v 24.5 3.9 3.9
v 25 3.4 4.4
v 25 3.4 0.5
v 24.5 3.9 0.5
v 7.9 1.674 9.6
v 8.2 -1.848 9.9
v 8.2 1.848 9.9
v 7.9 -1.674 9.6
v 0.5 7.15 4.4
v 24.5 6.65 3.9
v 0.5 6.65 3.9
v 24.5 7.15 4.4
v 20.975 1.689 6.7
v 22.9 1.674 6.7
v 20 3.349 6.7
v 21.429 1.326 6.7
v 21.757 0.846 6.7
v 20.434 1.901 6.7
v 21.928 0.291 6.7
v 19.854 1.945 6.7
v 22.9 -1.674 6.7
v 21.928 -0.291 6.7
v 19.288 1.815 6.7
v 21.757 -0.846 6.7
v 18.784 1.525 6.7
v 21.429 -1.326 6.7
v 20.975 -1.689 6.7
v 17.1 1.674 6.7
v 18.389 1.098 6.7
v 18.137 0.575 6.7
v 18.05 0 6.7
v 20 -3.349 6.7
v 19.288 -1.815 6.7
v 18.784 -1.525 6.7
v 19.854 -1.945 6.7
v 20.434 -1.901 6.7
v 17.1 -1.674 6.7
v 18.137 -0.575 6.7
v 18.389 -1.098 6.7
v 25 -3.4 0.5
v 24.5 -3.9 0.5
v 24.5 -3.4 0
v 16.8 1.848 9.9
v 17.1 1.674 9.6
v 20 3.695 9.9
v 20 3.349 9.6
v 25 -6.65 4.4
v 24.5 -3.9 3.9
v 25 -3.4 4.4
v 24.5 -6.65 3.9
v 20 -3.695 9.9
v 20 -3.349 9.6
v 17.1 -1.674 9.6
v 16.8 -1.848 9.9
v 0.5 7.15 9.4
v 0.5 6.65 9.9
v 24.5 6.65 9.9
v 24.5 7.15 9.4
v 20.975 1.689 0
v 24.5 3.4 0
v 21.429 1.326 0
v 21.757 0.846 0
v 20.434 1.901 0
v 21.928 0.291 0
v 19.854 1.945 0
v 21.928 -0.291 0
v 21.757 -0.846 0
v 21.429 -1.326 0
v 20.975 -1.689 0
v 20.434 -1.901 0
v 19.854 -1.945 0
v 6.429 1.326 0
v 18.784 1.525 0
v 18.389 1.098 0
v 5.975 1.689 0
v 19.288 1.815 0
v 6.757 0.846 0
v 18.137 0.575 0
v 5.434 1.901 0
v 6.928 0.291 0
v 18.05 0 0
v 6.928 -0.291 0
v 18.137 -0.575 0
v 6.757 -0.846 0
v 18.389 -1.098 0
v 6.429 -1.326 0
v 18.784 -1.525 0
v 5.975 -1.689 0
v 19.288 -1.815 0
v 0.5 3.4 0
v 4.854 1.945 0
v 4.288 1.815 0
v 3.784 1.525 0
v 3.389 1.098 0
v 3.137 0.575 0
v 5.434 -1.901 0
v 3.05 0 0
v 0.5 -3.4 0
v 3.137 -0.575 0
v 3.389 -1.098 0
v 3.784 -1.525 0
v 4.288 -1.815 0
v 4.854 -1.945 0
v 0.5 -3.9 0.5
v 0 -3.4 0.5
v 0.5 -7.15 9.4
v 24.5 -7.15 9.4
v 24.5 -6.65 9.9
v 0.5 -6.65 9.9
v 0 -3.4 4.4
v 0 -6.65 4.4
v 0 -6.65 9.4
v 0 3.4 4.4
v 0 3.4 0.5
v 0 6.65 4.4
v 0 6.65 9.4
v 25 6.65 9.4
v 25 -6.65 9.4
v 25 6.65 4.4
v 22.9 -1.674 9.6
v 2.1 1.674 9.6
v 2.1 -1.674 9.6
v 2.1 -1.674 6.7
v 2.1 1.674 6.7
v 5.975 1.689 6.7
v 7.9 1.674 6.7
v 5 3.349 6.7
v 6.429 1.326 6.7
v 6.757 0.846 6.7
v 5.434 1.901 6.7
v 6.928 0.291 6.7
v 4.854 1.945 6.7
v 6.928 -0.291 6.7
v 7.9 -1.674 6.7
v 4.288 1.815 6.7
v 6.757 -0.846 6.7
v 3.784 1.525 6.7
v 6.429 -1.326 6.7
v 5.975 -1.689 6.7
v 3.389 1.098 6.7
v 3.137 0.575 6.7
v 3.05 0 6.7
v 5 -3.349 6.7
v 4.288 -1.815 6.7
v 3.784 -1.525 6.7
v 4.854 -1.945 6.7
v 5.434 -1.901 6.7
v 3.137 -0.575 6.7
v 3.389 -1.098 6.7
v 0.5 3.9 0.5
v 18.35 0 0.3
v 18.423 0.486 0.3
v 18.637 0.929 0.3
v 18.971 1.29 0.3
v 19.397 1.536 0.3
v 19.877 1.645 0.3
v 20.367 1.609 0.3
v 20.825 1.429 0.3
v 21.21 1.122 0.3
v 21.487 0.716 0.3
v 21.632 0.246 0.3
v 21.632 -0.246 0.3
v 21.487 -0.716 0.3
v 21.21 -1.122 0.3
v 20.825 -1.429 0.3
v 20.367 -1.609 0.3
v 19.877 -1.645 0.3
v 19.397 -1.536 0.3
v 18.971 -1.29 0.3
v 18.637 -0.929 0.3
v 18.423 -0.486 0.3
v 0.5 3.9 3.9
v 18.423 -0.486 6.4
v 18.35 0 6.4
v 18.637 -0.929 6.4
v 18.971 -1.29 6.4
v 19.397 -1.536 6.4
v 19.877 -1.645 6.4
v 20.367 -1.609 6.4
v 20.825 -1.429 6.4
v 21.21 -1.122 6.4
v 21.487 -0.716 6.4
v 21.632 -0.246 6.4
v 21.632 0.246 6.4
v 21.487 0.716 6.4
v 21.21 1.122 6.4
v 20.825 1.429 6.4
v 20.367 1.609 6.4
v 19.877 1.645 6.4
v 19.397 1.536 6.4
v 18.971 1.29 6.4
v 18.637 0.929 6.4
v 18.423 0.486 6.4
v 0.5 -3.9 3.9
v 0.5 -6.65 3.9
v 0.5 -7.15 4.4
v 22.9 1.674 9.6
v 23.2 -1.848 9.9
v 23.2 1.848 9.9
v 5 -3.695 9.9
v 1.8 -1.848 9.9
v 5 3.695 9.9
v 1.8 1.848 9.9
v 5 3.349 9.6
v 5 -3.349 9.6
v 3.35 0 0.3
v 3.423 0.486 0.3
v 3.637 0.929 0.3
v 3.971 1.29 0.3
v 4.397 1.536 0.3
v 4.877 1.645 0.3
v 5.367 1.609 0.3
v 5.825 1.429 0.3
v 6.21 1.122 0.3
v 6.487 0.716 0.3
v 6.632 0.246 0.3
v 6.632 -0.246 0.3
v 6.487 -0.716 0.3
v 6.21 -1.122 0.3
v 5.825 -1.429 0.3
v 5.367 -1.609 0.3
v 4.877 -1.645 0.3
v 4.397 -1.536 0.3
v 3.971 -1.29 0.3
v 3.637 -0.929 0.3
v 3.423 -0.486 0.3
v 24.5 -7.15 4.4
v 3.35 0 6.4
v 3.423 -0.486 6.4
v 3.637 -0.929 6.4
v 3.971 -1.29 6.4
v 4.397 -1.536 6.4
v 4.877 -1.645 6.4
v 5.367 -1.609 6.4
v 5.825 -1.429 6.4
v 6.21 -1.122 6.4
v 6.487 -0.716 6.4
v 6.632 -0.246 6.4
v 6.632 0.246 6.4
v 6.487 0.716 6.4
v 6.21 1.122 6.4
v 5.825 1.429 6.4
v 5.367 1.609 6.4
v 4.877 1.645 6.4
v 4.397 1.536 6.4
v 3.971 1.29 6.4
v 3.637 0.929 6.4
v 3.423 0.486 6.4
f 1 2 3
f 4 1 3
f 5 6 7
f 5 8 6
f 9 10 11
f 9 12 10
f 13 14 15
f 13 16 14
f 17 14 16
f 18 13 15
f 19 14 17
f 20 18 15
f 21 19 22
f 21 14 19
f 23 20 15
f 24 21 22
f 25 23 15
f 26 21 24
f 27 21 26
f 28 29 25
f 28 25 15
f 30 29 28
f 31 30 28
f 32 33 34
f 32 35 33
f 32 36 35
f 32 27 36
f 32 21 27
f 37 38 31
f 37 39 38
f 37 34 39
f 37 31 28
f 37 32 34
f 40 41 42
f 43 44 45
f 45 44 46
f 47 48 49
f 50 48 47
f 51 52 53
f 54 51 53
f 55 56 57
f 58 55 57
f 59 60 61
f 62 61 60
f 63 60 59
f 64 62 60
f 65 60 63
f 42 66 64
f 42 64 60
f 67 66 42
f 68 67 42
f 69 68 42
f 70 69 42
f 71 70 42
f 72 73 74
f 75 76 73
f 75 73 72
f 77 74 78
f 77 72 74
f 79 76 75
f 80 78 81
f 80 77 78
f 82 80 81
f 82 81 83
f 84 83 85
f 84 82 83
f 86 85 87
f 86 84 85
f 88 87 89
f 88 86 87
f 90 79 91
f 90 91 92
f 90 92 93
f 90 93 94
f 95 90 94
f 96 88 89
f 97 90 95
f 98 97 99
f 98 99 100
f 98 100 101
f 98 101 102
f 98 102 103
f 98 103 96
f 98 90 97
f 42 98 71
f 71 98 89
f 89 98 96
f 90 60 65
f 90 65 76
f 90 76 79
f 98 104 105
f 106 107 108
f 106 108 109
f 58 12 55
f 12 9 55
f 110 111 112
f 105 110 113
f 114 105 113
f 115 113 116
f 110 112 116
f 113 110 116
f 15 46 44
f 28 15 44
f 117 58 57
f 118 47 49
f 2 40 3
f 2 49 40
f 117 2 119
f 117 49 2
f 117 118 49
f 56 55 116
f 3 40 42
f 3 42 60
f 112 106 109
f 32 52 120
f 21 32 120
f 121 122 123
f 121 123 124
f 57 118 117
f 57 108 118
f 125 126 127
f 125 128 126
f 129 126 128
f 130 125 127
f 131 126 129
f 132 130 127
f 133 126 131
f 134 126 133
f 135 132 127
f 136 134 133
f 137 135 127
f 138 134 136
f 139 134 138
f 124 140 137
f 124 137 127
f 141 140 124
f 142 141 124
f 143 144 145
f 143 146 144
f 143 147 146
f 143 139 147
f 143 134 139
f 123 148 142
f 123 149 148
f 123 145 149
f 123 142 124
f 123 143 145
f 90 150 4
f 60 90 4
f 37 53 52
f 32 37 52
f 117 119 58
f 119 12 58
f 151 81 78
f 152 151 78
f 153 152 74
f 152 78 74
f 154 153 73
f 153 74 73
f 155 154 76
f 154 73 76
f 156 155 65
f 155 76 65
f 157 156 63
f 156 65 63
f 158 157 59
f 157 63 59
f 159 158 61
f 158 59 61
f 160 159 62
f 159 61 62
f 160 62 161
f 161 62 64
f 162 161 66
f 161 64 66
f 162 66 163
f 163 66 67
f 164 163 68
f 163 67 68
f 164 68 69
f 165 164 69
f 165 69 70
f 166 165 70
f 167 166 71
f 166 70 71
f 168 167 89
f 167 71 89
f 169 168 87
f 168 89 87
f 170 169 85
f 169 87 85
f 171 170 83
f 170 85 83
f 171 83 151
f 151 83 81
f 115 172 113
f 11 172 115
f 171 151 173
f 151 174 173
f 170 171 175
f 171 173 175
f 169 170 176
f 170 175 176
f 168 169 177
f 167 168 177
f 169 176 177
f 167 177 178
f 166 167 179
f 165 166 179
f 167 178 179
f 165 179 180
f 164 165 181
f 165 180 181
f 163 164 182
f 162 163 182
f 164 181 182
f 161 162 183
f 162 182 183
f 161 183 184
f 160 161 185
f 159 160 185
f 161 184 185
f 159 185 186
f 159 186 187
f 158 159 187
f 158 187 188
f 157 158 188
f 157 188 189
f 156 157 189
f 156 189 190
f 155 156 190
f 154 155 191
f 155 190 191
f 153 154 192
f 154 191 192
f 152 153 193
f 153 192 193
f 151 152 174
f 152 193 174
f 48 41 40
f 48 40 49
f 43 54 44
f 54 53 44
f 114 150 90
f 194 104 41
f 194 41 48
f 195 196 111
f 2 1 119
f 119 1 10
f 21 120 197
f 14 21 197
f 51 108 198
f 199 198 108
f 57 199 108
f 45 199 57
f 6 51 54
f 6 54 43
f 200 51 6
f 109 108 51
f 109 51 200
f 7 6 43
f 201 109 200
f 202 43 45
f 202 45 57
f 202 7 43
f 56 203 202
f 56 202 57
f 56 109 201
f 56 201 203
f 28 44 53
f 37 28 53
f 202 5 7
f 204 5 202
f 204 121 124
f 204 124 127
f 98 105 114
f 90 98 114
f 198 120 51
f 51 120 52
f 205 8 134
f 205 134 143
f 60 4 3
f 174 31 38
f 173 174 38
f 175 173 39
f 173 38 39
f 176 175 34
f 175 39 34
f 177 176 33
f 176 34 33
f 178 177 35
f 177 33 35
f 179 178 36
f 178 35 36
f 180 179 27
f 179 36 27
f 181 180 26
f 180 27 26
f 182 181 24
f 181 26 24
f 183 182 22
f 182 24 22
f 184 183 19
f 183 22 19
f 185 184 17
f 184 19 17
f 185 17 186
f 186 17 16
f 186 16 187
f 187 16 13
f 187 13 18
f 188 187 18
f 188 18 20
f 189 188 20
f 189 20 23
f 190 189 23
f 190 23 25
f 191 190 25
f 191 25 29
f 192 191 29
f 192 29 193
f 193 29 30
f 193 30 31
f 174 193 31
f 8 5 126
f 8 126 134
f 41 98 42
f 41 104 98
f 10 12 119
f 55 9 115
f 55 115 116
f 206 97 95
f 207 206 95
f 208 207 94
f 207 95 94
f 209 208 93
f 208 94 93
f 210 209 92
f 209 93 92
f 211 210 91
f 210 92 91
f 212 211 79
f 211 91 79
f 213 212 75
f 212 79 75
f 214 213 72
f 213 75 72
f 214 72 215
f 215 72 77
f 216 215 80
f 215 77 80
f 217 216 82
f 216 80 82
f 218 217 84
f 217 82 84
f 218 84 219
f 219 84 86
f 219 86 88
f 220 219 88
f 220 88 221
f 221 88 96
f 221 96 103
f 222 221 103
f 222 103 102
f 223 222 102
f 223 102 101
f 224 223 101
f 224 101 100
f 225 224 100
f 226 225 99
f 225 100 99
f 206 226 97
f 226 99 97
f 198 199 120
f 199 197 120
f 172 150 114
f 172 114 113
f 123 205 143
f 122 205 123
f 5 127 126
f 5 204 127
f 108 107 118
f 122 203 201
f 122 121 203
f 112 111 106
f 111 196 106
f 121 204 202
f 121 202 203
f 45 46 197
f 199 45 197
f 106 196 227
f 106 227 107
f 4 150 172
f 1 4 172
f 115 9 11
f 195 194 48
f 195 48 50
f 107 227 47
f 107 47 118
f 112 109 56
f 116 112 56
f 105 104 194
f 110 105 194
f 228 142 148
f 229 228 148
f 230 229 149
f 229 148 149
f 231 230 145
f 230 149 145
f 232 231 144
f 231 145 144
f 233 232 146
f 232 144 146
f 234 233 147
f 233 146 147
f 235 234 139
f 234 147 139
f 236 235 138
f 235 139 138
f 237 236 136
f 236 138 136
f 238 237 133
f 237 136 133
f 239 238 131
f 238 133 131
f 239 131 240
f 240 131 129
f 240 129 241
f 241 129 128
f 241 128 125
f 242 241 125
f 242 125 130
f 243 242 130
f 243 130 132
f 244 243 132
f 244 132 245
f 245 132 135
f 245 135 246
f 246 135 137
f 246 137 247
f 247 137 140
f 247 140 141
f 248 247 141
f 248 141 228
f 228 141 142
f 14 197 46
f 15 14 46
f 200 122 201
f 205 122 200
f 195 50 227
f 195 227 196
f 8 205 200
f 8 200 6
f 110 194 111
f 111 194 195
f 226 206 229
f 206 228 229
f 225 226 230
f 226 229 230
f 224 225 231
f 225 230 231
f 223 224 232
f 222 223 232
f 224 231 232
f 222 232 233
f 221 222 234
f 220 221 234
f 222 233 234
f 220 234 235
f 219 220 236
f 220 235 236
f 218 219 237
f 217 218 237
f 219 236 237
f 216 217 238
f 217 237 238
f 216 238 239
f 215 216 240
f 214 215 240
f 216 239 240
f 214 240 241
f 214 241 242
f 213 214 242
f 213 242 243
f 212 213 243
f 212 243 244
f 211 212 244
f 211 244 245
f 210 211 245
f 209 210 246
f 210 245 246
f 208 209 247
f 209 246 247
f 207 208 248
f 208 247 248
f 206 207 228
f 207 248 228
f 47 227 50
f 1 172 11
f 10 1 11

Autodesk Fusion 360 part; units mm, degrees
sketch "Skizze1" plane through (0, 0, 0) normal (1, 0, 0) x (0, 1, 0)
  line L0 (0, 0) -> (0, 17.0455) construction
  line L1 (0, 0) -> (-3.9, 0)
  line L2 (-3.9, 0) -> (-3.9, 3.9)
  line L3 (-3.9, 3.9) -> (-7.15, 3.9)
  line L4 (-7.15, 3.9) -> (-7.15, 9.9)
  line L5 (-7.15, 9.9) -> (0, 9.9)
  line L6 (0, 0) -> (3.9, 0)
  line L7 (3.9, 0) -> (3.9, 3.9)
  line L8 (3.9, 3.9) -> (7.15, 3.9)
  line L9 (7.15, 3.9) -> (7.15, 9.9)
  line L10 (7.15, 9.9) -> (0, 9.9)
  dimension "d2" = 14.3
  dimension "d4" = 3.9
  dimension "d5" = 7.8
  dimension "d17" = 6
extrude "Extrusion1" add sketch "Skizze1" along normal blind 25
sketch "Skizze2" plane through (0, 0, 9.9) normal (0, 0, 1) x (-1, 0, 0)
  line L0 (0, -7.15) -> (0, 7.15)
  line L1 (0, 7.15) -> (-25, 7.15)
  line L2 (-25, 7.15) -> (-25, -7.15)
  line L3 (-25, -7.15) -> (0, -7.15)
  line L4 (-12.5, -7.15) -> (-12.5, 7.15)
  circle A0 centre (-20, 0) radius 1.65
  line L5 (-17.1, 1.6743) -> (-20, 3.3486)
  line L6 (-20, 3.3486) -> (-22.9, 1.6743)
  line L7 (-22.9, 1.6743) -> (-22.9, -1.6743)
  line L8 (-22.9, -1.6743) -> (-20, -3.3486)
  line L9 (-20, -3.3486) -> (-17.1, -1.6743)
  line L10 (-17.1, -1.6743) -> (-17.1, 1.6743)
  line L11 (-12.5, 0) -> (-20, 0) construction
  line L12 (-7.9, -1.6743) -> (-7.9, 1.6743)
  line L13 (-5, 3.3486) -> (-2.1, 1.6743)
  line L14 (-2.1, -1.6743) -> (-5, -3.3486)
  line L15 (-5, -3.3486) -> (-7.9, -1.6743)
  line L16 (-7.9, 1.6743) -> (-5, 3.3486)
  line L17 (-2.1, 1.6743) -> (-2.1, -1.6743)
  circle A1 centre (-5, 0) radius 1.65
  point P0 (-20, 0)
  point P1 (-5, 0)
  point P2 (-5, 0)
  dimension "d8" = 3.3
  dimension "d9" = 5.8
  dimension "d10" = 15
extrude "Extrusion2" cut sketch "Skizze2" against normal through all contours A0 | A1
extrude "Extrusion3" cut sketch "Skizze2" against normal blind 3.2 contours L5 L6 L7 L8 L9 L10 | L12 L13 L14 L15 L16 L17
chamfer "Fase1" distance 0.3 angle 45 4 edges at (6.5383, 0.5967, 0) (21.5383, 0.5967, 0) (6.5383, 0.5967, 6.7) (21.5383, 0.5967, 6.7)
chamfer "Fase1" distance 0.5 angle 45 22 edges at (0, 7.15, 6.9) (0, -7.15, 6.9) (25, -7.15, 6.9) (25, 7.15, 6.9) (25, 3.9, 1.95) (25, -3.9, 1.95) (0, -3.9, 1.95) (0, 3.9, 1.95) (12.5, 7.15, 9.9) (12.5, -7.15, 9.9) (12.5, 7.15, 3.9) (12.5, -7.15, 3.9) (12.5, 3.9, 0) (12.5, -3.9, 0) (25, -5.525, 3.9) (25, 5.525, 3.9) (0, 5.525, 3.9) (0, -5.525, 3.9) (0, 0, 0) (25, 0, 0) (25, 0, 9.9) (0, 0, 9.9)
chamfer "Fase1" distance 0.3 angle 45 12 edges at (3.55, 2.5115, 9.9) (6.45, 2.5115, 9.9) (7.9, 0, 9.9) (6.45, -2.5115, 9.9) (3.55, -2.5115, 9.9) (2.1, 0, 9.9) (17.1, 0, 9.9) (18.55, 2.5115, 9.9) (21.45, 2.5115, 9.9) (22.9, 0, 9.9) (21.45, -2.5115, 9.9) (18.55, -2.5115, 9.9)
